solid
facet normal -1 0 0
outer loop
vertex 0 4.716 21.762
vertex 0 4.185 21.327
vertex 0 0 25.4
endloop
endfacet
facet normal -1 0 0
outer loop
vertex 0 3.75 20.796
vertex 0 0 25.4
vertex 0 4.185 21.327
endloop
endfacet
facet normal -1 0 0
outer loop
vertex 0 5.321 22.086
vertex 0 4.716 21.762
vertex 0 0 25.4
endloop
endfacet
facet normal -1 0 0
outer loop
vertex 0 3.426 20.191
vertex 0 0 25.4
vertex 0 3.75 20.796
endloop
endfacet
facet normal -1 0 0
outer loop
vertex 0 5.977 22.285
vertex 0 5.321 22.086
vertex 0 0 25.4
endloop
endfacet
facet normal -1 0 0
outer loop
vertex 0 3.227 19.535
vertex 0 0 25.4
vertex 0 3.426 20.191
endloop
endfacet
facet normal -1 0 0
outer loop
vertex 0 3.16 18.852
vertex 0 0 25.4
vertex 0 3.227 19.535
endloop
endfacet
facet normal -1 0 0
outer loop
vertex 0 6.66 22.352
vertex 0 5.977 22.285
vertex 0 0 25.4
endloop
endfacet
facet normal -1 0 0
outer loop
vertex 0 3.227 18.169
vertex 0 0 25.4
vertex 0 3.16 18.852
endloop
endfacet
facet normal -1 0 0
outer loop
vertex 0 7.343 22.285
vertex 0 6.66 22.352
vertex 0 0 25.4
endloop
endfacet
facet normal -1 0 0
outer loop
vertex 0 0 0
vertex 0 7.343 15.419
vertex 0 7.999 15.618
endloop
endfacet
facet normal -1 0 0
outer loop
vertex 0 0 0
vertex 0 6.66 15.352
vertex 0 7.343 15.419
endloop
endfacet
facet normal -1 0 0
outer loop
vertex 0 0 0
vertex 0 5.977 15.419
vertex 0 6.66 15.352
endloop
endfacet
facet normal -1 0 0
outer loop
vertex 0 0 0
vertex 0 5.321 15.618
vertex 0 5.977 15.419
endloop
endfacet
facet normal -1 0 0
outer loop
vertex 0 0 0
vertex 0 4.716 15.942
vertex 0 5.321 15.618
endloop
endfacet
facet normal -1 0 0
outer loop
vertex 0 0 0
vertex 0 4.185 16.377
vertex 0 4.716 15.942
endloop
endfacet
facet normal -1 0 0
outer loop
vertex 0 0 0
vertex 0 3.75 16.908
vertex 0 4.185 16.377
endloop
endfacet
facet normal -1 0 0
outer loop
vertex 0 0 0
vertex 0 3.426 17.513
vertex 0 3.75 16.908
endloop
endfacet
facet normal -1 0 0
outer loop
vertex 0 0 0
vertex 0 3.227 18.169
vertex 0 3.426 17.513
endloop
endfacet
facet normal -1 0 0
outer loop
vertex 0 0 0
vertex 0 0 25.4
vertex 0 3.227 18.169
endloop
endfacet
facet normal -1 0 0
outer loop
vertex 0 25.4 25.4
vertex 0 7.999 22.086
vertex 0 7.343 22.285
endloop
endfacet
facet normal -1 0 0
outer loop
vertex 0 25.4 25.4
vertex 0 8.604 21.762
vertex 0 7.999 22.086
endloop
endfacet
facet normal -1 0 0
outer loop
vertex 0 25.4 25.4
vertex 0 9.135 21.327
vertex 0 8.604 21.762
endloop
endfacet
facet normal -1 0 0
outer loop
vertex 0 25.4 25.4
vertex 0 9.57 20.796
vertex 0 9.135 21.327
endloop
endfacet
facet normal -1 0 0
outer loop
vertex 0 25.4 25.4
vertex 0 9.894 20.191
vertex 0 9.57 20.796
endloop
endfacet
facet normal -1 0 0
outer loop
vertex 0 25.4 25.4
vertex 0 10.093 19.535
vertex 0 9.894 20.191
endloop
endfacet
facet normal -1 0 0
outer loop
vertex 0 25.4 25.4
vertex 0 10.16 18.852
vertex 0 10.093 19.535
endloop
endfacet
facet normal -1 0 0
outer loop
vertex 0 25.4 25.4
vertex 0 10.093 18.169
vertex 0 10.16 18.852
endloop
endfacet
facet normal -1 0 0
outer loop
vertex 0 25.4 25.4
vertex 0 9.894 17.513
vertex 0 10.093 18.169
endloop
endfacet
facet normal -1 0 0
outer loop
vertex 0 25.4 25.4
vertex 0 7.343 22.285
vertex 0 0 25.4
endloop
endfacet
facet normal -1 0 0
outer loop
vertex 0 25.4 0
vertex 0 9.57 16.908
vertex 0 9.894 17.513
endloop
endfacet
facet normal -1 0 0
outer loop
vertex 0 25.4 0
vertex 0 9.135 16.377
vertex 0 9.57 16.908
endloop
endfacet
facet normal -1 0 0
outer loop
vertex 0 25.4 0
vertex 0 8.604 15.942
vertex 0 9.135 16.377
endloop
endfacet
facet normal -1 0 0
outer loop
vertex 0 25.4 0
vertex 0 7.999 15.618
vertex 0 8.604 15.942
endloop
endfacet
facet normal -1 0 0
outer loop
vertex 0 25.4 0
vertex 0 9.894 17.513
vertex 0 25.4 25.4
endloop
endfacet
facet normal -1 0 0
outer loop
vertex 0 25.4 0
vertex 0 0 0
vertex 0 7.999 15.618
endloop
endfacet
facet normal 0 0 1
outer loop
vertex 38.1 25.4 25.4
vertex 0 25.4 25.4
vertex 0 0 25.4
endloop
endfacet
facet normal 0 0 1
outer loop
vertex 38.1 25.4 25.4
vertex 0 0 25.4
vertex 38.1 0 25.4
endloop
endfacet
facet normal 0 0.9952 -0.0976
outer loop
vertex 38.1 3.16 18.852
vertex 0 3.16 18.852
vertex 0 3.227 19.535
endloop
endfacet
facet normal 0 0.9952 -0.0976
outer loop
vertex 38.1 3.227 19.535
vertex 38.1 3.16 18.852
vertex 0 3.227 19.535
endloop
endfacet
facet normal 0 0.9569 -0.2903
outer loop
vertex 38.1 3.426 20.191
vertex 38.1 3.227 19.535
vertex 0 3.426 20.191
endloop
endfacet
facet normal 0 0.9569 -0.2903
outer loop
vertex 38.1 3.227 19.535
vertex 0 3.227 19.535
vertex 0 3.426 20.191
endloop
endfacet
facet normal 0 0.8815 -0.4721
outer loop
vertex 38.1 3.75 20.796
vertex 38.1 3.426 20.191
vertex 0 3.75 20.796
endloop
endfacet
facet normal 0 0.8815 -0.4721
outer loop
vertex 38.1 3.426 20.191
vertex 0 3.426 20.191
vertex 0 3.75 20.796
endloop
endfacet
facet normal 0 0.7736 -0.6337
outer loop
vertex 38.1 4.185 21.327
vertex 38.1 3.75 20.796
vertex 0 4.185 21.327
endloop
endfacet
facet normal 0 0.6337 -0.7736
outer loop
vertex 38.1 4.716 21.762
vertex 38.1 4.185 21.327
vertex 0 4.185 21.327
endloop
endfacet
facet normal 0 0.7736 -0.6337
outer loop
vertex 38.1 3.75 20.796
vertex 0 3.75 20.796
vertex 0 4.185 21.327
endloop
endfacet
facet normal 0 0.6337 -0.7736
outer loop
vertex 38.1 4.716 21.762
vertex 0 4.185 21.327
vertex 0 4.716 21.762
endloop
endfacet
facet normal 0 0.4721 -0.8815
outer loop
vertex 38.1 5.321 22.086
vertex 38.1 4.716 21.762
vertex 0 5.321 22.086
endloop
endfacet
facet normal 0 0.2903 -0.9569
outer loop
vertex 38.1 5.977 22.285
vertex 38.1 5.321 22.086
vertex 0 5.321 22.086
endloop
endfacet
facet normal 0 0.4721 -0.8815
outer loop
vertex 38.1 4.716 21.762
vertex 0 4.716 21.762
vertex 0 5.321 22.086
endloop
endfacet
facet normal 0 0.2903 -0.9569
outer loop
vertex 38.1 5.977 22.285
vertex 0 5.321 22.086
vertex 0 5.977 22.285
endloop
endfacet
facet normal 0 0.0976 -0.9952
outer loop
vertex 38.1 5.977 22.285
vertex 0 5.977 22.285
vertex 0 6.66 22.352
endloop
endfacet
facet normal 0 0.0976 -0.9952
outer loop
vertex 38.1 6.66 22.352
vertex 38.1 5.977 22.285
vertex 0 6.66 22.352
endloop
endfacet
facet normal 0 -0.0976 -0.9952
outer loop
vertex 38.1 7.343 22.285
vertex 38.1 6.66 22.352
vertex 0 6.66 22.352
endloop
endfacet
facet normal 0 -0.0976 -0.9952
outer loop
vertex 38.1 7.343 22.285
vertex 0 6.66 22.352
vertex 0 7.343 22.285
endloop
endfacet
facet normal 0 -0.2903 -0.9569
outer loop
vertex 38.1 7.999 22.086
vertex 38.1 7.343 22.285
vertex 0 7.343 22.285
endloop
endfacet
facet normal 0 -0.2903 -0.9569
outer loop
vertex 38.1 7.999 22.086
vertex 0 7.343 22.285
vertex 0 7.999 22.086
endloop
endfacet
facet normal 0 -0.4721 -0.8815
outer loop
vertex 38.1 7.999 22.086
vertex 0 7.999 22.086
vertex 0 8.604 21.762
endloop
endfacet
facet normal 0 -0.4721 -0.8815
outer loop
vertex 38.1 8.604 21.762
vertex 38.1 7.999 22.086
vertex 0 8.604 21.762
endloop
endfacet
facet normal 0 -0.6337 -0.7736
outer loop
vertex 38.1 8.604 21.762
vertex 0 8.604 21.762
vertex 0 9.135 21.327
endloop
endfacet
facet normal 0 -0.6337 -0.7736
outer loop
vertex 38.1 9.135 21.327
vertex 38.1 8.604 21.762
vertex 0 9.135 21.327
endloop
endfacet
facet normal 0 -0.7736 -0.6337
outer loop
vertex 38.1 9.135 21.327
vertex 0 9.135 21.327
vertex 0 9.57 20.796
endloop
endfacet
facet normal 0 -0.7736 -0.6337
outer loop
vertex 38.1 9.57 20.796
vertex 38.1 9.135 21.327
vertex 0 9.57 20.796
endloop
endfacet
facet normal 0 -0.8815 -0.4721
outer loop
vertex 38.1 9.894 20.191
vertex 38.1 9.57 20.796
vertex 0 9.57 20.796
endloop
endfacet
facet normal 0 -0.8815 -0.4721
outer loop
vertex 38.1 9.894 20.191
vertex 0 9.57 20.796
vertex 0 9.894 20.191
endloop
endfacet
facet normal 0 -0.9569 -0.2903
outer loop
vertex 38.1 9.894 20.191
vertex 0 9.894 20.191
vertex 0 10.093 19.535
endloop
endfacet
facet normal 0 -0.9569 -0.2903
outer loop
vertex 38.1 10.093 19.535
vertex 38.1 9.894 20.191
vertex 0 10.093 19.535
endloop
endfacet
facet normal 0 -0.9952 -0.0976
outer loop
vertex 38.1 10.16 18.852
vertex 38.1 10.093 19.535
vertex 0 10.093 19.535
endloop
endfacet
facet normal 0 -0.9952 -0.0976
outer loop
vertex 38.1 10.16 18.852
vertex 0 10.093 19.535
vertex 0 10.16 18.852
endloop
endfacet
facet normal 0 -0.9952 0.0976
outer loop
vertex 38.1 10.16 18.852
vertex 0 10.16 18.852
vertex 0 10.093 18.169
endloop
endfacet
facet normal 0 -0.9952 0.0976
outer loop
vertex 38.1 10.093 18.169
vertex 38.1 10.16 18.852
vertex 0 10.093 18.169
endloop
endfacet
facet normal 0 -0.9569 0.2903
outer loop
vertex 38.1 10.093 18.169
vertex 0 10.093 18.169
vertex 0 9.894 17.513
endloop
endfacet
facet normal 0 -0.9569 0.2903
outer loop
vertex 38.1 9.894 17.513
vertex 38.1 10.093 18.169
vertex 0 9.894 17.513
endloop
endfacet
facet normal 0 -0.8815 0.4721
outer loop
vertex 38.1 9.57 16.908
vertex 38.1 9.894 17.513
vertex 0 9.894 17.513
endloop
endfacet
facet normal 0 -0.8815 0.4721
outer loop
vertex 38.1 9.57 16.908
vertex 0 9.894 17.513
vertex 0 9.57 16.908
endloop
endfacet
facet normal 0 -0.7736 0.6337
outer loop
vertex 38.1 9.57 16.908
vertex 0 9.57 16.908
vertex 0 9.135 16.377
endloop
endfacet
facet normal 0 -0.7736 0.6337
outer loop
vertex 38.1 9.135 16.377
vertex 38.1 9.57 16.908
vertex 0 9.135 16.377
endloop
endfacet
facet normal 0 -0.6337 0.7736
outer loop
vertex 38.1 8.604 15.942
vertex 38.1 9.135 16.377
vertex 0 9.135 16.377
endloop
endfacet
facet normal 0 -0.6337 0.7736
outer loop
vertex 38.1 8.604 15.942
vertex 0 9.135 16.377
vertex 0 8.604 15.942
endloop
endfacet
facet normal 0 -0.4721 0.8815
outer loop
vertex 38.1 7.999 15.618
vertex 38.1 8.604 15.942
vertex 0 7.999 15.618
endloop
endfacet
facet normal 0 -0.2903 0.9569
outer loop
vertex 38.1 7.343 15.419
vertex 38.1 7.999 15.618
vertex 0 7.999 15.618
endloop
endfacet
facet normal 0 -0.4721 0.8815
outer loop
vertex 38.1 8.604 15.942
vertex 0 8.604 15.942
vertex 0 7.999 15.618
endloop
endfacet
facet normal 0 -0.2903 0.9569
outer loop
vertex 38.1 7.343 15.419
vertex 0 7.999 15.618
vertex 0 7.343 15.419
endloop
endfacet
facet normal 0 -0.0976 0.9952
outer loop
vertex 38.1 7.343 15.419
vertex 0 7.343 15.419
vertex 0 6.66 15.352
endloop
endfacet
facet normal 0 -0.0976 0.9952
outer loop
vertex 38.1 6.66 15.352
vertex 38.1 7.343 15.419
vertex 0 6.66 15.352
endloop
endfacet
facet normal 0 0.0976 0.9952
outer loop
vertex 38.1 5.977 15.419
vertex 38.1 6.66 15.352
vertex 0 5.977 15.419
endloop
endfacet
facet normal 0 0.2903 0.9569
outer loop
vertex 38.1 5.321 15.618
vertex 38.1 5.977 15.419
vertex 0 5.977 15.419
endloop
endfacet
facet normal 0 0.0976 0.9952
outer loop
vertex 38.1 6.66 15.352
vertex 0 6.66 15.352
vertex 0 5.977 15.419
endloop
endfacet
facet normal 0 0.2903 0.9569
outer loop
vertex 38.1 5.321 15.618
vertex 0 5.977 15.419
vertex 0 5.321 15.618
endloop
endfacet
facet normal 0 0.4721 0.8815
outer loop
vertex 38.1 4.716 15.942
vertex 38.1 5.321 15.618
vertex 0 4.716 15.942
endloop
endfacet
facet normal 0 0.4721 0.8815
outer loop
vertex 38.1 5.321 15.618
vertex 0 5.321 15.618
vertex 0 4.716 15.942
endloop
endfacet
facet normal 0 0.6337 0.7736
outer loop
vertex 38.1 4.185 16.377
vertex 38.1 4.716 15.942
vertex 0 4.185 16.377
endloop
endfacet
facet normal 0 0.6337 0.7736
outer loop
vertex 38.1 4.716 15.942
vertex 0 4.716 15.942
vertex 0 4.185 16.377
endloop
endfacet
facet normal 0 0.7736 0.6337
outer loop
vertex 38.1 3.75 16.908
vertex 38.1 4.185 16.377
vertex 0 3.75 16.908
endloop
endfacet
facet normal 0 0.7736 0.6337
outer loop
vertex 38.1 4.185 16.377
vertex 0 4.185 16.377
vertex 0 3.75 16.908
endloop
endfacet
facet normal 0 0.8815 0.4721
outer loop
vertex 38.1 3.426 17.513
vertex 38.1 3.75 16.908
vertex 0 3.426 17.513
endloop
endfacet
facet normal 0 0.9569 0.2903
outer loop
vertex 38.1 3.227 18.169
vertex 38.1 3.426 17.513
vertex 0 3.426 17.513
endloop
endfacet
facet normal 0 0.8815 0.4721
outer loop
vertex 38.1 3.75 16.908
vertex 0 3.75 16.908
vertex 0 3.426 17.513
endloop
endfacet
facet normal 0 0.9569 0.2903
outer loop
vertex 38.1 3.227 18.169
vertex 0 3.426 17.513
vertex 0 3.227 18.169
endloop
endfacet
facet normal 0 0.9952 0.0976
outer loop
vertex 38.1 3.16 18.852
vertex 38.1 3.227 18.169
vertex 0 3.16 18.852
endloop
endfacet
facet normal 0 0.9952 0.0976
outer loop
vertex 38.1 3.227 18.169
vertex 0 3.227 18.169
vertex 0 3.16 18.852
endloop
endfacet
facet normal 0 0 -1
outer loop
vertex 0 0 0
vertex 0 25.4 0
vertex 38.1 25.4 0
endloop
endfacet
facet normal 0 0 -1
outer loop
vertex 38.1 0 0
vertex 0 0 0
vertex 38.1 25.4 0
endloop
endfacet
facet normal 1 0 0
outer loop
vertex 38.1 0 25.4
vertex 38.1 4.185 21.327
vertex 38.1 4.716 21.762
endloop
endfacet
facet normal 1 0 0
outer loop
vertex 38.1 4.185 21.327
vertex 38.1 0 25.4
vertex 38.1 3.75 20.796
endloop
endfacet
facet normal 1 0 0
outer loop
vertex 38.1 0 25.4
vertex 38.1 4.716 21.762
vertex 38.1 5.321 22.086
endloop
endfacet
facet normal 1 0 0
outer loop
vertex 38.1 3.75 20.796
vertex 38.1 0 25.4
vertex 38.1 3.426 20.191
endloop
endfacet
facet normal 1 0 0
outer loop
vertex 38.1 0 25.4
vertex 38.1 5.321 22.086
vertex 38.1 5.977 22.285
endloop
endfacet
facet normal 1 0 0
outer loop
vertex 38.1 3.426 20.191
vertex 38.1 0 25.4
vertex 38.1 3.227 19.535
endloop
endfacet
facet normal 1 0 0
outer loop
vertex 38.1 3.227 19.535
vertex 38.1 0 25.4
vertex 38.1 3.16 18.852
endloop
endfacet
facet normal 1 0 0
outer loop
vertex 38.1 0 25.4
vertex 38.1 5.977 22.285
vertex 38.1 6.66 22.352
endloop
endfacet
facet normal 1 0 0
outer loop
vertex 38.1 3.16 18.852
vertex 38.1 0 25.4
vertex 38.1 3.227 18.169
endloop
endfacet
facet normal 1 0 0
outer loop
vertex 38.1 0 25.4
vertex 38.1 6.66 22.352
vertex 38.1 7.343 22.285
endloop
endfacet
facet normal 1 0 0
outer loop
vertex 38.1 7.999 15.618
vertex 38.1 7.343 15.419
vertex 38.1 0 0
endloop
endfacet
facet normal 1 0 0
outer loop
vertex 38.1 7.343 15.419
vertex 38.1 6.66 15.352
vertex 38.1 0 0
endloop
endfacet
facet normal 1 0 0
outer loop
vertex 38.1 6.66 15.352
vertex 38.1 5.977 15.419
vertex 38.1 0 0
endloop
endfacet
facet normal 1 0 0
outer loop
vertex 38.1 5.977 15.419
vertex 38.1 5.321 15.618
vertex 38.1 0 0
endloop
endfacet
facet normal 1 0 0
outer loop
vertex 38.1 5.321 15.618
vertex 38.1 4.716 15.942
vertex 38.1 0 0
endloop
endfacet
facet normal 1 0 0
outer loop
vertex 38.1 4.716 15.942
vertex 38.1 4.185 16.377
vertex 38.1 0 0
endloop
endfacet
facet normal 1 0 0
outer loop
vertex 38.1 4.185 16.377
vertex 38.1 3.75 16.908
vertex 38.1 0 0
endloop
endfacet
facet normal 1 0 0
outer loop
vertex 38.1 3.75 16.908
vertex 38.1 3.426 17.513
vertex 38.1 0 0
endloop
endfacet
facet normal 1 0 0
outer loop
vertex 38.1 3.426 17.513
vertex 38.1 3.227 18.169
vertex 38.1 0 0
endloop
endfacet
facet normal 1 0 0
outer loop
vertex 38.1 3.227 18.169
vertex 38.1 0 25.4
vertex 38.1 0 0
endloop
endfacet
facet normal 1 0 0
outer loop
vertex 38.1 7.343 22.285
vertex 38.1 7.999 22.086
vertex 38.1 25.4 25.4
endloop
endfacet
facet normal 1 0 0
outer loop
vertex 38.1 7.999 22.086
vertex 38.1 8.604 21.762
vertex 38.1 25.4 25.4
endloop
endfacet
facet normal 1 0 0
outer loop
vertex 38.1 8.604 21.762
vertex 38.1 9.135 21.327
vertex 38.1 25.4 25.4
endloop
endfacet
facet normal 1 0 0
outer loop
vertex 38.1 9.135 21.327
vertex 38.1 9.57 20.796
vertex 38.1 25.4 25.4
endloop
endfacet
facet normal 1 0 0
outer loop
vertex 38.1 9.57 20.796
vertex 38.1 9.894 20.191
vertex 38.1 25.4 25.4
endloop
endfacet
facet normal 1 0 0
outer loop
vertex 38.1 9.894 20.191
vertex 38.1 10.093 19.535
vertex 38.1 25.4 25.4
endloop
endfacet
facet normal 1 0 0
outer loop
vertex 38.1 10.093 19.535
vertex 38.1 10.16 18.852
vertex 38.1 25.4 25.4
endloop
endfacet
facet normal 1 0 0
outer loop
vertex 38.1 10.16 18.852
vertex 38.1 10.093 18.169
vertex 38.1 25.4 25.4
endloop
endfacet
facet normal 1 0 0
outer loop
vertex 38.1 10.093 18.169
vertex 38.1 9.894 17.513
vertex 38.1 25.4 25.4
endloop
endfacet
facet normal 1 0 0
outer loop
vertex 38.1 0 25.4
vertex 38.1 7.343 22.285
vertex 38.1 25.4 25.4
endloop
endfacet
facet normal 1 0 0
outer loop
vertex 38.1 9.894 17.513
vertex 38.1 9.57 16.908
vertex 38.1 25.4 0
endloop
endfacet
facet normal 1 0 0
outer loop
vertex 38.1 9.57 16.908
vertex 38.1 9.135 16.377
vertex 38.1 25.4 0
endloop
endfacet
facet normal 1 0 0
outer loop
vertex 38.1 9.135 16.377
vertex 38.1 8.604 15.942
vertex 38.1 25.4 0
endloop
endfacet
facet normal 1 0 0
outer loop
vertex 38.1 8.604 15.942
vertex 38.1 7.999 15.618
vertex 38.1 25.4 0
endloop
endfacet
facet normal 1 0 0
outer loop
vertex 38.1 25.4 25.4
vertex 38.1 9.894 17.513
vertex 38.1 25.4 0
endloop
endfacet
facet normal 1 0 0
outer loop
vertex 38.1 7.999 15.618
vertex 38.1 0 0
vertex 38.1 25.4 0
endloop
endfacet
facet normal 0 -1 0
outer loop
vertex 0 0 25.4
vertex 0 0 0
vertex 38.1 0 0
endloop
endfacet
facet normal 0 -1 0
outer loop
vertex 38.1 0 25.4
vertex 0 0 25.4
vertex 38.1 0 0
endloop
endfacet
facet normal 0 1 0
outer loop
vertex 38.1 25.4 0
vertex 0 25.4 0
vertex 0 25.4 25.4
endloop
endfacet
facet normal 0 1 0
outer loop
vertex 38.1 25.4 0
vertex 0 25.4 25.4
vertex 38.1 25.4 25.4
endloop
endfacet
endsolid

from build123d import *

# Parameters (mm, degrees)
F0_W     = 38.1
F0_H     = 25.4
F1_DEPTH = 25.4
F3_D     = 7


with BuildPart() as f1:
    # F0 (on Top) → F1 (new body)
    with BuildSketch(Plane.XY):
        with Locations((19.05, 12.7)):
            Rectangle(F0_W, F0_H)
    extrude(amount=F1_DEPTH)

    # F3 (through all)
    with Locations(Plane.YZ.offset(38.1)):
        with Locations((6.66, 18.852)):
            Hole(F3_D / 2)


solid = f1.part
